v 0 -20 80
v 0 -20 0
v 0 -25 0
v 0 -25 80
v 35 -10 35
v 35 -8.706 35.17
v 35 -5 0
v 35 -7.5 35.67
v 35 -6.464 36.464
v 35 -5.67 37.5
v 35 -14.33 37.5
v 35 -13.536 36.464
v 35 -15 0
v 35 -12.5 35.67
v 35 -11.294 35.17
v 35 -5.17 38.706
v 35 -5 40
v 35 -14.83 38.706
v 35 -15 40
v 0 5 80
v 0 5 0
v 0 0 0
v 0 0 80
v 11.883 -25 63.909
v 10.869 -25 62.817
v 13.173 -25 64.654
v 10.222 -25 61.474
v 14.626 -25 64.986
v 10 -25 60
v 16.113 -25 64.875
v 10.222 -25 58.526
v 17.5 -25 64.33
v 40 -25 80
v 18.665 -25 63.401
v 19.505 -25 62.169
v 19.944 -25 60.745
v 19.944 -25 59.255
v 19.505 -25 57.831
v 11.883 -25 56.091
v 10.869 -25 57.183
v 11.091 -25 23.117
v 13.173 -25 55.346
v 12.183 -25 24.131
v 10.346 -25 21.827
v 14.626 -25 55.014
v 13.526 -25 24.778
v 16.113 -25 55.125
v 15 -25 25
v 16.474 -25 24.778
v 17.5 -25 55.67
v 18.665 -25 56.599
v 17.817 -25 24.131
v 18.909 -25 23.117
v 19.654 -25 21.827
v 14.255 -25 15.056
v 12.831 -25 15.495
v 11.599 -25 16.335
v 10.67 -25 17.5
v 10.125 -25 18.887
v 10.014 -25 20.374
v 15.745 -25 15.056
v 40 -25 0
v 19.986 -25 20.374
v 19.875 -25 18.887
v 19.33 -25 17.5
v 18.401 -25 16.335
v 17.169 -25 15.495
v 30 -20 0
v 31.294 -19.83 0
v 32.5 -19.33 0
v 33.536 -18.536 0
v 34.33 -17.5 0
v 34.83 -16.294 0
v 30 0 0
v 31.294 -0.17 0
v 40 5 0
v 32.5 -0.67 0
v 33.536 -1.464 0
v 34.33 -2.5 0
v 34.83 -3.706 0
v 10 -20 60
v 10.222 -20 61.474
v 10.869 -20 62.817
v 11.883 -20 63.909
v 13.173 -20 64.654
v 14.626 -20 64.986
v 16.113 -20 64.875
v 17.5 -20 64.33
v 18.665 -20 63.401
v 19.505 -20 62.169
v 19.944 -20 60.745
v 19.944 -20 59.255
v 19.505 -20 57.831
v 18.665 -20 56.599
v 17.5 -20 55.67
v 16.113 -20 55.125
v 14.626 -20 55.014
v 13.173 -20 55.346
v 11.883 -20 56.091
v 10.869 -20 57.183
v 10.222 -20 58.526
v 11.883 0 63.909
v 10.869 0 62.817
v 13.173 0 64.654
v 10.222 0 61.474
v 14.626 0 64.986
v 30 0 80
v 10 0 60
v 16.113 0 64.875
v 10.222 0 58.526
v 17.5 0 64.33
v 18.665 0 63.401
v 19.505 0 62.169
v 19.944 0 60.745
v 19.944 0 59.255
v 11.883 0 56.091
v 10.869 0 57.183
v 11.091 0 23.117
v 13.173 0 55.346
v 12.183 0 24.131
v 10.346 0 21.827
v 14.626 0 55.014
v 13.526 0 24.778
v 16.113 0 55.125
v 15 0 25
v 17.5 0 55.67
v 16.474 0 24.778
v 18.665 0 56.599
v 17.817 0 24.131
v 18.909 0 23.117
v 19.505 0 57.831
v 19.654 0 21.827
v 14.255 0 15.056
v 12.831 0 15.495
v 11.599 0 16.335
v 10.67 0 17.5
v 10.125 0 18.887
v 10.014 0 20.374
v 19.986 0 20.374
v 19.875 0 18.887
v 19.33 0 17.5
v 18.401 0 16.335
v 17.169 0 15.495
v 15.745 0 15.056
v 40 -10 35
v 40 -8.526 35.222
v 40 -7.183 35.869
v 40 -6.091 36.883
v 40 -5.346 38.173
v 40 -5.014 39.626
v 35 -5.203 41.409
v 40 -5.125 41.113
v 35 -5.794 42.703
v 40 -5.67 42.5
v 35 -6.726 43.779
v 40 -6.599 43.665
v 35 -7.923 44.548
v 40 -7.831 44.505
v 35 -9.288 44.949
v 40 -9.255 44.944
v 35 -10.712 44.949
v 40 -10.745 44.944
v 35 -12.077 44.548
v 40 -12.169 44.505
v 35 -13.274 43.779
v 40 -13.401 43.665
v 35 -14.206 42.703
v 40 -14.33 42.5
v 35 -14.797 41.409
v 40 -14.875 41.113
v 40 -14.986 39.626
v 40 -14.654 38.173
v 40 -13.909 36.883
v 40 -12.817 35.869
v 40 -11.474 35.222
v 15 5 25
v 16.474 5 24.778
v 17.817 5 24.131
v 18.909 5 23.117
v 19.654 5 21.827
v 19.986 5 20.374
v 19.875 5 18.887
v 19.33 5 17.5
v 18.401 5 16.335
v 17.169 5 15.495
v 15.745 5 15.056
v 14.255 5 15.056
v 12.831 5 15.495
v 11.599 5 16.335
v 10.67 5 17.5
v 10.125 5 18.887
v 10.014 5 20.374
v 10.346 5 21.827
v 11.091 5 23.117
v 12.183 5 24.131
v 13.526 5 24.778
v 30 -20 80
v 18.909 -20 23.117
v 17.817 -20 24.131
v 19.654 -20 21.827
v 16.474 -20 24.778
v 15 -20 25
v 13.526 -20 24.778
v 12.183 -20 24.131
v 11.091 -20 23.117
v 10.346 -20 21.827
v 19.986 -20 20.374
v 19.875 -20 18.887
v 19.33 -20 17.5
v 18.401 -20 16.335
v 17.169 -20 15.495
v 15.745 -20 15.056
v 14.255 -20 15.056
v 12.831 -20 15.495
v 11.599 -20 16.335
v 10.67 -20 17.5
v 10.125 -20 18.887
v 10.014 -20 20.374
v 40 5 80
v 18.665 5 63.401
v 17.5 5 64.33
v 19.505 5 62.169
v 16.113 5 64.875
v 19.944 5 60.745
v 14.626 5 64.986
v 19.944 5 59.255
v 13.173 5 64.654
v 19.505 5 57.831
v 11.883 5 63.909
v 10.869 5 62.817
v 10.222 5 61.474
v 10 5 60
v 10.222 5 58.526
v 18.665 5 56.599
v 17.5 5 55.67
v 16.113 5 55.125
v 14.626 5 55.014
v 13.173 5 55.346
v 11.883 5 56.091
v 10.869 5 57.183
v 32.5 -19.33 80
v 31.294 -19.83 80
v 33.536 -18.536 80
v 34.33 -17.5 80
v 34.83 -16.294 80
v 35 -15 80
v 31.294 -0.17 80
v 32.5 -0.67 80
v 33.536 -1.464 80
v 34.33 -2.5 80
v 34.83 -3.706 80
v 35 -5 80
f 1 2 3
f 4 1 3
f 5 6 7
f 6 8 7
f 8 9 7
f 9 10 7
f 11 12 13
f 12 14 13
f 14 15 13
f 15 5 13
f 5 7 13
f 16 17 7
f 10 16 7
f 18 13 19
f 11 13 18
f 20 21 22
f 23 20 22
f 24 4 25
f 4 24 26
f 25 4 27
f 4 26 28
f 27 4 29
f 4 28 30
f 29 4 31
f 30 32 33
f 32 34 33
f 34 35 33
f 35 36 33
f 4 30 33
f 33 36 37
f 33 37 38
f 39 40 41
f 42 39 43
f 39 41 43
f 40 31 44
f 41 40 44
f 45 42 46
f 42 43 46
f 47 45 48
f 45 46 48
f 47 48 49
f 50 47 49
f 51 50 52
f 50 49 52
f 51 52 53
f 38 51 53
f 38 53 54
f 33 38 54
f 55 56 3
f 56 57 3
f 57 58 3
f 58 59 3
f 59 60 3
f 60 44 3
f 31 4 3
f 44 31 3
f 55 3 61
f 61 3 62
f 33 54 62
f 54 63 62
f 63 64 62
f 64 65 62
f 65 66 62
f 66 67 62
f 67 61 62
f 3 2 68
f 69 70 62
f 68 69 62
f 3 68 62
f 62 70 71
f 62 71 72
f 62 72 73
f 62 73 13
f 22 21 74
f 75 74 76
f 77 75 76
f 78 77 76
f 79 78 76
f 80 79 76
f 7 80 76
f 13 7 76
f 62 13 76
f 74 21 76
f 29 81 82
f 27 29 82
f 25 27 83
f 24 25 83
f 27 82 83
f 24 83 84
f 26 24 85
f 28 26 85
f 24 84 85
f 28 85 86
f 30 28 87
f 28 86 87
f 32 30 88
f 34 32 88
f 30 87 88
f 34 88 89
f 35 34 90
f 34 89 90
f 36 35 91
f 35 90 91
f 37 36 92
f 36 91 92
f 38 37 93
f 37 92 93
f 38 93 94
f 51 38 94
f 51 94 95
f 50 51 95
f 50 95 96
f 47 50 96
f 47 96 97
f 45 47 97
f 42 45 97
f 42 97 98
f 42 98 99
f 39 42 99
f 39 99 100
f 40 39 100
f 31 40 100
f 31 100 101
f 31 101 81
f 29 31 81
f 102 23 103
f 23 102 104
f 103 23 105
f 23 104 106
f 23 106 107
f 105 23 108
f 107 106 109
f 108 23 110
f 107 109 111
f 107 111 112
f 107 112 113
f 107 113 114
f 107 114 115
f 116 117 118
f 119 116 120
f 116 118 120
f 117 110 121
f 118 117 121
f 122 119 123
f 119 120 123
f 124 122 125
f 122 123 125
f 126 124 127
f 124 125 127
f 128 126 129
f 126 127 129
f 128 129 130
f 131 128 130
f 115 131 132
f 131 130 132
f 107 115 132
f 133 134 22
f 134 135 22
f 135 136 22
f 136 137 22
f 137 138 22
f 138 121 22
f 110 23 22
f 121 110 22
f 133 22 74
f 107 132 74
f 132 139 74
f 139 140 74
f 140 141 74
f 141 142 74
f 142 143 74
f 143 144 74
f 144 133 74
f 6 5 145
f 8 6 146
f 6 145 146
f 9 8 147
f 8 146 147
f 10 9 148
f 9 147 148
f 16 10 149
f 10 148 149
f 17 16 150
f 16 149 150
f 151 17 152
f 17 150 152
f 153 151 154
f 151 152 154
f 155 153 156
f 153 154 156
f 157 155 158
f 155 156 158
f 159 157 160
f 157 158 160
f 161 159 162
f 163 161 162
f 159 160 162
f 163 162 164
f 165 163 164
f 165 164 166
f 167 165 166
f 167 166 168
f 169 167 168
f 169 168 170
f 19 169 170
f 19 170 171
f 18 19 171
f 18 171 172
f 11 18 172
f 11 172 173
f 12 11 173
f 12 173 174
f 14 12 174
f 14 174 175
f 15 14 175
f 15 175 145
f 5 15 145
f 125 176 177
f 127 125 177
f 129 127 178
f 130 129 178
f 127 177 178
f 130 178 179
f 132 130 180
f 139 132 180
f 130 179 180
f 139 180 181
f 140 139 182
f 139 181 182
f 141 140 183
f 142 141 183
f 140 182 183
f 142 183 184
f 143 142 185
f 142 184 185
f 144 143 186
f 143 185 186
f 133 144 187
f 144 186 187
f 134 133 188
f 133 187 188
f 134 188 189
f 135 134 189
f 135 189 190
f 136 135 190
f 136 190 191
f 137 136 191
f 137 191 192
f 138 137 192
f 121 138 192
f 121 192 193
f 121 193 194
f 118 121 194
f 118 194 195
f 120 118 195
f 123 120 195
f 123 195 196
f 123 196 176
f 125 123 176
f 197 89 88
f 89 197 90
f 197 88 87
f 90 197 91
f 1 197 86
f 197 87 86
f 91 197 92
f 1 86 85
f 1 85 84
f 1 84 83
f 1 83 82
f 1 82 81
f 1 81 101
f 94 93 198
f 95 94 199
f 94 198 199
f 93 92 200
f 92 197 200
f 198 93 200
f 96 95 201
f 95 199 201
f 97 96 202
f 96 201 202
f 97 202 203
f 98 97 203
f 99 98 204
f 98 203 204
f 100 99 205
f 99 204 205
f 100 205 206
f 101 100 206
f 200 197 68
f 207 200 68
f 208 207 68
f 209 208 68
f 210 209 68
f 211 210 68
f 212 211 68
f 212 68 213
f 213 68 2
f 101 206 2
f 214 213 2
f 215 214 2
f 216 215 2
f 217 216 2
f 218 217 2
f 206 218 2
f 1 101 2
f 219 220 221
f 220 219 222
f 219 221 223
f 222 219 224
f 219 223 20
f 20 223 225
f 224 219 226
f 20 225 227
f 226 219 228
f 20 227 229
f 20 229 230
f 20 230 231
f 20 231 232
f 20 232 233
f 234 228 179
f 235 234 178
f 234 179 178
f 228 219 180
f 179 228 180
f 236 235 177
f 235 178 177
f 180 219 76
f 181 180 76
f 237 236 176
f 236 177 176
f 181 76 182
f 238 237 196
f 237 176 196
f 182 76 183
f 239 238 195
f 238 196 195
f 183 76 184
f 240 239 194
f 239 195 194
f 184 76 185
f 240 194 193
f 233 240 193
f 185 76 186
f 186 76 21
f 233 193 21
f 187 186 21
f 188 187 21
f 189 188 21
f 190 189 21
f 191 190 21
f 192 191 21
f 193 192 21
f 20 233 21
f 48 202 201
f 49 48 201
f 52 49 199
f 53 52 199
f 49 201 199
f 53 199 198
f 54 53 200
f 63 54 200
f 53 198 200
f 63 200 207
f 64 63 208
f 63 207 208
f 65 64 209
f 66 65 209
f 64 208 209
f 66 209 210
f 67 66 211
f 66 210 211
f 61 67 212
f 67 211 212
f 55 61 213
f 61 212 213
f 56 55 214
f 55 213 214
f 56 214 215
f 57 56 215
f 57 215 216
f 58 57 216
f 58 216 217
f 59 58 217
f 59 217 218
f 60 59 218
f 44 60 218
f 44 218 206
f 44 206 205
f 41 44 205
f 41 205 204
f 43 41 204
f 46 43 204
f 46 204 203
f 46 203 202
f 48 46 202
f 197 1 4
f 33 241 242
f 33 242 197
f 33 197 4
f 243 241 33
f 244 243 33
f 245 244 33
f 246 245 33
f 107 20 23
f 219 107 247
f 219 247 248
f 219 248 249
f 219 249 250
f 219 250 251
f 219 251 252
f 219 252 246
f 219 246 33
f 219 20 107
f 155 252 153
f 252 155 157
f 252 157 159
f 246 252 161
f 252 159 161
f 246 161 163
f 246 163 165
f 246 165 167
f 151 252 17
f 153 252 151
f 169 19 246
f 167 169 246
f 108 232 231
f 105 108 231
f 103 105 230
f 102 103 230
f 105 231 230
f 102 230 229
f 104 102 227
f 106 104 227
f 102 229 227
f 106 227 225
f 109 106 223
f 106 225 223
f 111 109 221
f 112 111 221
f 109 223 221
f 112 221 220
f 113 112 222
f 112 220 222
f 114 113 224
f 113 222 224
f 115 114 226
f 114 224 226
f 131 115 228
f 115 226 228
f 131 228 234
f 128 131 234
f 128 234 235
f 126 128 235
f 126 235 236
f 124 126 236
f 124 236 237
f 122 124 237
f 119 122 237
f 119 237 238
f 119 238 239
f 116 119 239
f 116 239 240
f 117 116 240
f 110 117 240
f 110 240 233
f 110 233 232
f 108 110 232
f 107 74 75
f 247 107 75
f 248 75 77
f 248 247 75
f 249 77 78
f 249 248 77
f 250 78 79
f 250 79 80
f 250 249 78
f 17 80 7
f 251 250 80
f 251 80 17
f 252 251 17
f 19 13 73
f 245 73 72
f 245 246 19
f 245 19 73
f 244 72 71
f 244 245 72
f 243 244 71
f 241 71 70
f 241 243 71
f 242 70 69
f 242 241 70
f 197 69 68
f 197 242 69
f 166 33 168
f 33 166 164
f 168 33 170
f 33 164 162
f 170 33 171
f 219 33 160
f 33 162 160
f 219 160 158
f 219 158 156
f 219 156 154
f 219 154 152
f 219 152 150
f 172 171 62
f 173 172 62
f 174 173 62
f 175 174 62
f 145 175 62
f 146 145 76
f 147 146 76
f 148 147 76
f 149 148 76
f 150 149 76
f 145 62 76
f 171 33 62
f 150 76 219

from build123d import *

# Parameters (mm, degrees)
BOSS_EXTRUDE1_DEPTH = 80
FILLET1_R           = 5
SKETCH2_R           = 5
CUT_EXTRUDE1_DEPTH  = 75
SKETCH3_R           = 5
CUT_EXTRUDE2_DEPTH  = 10


with BuildPart() as part:
    # Sketch1 → Boss-Extrude1 (new body)
    with BuildSketch(Plane.XY):
        Polygon((0, 0), (35, 0), (35, -20), (0, -20), (0, -25), (40, -25), (40, 5), (0, 5), align=None)
    extrude(amount=BOSS_EXTRUDE1_DEPTH)

    # Fillet1
    fillet1_edges = [part.edges().sort_by_distance(p)[0] for p in [
        (35, -20, 40),
        (35, 0, 40),
    ]]
    fillet(fillet1_edges, radius=FILLET1_R)

    # Sketch2 → Cut-Extrude1 (cut)
    with BuildSketch(Plane(origin=(0, 5, 0), x_dir=(1, 0, 0), z_dir=(0, 1, 0))):
        with Locations(Location((15, -60, 0), (0, 0, 180))):
            Circle(SKETCH2_R)
        with Locations(Location((15, -20, 0), (0, 0, 270))):
            Circle(SKETCH2_R)
    extrude(amount=-CUT_EXTRUDE1_DEPTH, mode=Mode.SUBTRACT)

    # Sketch3 → Cut-Extrude2 (cut)
    with BuildSketch(Plane(origin=(40, 0, 0), x_dir=(0, 0, -1), z_dir=(1, 0, 0))):
        with Locations((-40, -10)):
            Circle(SKETCH3_R)
    extrude(amount=-CUT_EXTRUDE2_DEPTH, mode=Mode.SUBTRACT)


solid = part.part
